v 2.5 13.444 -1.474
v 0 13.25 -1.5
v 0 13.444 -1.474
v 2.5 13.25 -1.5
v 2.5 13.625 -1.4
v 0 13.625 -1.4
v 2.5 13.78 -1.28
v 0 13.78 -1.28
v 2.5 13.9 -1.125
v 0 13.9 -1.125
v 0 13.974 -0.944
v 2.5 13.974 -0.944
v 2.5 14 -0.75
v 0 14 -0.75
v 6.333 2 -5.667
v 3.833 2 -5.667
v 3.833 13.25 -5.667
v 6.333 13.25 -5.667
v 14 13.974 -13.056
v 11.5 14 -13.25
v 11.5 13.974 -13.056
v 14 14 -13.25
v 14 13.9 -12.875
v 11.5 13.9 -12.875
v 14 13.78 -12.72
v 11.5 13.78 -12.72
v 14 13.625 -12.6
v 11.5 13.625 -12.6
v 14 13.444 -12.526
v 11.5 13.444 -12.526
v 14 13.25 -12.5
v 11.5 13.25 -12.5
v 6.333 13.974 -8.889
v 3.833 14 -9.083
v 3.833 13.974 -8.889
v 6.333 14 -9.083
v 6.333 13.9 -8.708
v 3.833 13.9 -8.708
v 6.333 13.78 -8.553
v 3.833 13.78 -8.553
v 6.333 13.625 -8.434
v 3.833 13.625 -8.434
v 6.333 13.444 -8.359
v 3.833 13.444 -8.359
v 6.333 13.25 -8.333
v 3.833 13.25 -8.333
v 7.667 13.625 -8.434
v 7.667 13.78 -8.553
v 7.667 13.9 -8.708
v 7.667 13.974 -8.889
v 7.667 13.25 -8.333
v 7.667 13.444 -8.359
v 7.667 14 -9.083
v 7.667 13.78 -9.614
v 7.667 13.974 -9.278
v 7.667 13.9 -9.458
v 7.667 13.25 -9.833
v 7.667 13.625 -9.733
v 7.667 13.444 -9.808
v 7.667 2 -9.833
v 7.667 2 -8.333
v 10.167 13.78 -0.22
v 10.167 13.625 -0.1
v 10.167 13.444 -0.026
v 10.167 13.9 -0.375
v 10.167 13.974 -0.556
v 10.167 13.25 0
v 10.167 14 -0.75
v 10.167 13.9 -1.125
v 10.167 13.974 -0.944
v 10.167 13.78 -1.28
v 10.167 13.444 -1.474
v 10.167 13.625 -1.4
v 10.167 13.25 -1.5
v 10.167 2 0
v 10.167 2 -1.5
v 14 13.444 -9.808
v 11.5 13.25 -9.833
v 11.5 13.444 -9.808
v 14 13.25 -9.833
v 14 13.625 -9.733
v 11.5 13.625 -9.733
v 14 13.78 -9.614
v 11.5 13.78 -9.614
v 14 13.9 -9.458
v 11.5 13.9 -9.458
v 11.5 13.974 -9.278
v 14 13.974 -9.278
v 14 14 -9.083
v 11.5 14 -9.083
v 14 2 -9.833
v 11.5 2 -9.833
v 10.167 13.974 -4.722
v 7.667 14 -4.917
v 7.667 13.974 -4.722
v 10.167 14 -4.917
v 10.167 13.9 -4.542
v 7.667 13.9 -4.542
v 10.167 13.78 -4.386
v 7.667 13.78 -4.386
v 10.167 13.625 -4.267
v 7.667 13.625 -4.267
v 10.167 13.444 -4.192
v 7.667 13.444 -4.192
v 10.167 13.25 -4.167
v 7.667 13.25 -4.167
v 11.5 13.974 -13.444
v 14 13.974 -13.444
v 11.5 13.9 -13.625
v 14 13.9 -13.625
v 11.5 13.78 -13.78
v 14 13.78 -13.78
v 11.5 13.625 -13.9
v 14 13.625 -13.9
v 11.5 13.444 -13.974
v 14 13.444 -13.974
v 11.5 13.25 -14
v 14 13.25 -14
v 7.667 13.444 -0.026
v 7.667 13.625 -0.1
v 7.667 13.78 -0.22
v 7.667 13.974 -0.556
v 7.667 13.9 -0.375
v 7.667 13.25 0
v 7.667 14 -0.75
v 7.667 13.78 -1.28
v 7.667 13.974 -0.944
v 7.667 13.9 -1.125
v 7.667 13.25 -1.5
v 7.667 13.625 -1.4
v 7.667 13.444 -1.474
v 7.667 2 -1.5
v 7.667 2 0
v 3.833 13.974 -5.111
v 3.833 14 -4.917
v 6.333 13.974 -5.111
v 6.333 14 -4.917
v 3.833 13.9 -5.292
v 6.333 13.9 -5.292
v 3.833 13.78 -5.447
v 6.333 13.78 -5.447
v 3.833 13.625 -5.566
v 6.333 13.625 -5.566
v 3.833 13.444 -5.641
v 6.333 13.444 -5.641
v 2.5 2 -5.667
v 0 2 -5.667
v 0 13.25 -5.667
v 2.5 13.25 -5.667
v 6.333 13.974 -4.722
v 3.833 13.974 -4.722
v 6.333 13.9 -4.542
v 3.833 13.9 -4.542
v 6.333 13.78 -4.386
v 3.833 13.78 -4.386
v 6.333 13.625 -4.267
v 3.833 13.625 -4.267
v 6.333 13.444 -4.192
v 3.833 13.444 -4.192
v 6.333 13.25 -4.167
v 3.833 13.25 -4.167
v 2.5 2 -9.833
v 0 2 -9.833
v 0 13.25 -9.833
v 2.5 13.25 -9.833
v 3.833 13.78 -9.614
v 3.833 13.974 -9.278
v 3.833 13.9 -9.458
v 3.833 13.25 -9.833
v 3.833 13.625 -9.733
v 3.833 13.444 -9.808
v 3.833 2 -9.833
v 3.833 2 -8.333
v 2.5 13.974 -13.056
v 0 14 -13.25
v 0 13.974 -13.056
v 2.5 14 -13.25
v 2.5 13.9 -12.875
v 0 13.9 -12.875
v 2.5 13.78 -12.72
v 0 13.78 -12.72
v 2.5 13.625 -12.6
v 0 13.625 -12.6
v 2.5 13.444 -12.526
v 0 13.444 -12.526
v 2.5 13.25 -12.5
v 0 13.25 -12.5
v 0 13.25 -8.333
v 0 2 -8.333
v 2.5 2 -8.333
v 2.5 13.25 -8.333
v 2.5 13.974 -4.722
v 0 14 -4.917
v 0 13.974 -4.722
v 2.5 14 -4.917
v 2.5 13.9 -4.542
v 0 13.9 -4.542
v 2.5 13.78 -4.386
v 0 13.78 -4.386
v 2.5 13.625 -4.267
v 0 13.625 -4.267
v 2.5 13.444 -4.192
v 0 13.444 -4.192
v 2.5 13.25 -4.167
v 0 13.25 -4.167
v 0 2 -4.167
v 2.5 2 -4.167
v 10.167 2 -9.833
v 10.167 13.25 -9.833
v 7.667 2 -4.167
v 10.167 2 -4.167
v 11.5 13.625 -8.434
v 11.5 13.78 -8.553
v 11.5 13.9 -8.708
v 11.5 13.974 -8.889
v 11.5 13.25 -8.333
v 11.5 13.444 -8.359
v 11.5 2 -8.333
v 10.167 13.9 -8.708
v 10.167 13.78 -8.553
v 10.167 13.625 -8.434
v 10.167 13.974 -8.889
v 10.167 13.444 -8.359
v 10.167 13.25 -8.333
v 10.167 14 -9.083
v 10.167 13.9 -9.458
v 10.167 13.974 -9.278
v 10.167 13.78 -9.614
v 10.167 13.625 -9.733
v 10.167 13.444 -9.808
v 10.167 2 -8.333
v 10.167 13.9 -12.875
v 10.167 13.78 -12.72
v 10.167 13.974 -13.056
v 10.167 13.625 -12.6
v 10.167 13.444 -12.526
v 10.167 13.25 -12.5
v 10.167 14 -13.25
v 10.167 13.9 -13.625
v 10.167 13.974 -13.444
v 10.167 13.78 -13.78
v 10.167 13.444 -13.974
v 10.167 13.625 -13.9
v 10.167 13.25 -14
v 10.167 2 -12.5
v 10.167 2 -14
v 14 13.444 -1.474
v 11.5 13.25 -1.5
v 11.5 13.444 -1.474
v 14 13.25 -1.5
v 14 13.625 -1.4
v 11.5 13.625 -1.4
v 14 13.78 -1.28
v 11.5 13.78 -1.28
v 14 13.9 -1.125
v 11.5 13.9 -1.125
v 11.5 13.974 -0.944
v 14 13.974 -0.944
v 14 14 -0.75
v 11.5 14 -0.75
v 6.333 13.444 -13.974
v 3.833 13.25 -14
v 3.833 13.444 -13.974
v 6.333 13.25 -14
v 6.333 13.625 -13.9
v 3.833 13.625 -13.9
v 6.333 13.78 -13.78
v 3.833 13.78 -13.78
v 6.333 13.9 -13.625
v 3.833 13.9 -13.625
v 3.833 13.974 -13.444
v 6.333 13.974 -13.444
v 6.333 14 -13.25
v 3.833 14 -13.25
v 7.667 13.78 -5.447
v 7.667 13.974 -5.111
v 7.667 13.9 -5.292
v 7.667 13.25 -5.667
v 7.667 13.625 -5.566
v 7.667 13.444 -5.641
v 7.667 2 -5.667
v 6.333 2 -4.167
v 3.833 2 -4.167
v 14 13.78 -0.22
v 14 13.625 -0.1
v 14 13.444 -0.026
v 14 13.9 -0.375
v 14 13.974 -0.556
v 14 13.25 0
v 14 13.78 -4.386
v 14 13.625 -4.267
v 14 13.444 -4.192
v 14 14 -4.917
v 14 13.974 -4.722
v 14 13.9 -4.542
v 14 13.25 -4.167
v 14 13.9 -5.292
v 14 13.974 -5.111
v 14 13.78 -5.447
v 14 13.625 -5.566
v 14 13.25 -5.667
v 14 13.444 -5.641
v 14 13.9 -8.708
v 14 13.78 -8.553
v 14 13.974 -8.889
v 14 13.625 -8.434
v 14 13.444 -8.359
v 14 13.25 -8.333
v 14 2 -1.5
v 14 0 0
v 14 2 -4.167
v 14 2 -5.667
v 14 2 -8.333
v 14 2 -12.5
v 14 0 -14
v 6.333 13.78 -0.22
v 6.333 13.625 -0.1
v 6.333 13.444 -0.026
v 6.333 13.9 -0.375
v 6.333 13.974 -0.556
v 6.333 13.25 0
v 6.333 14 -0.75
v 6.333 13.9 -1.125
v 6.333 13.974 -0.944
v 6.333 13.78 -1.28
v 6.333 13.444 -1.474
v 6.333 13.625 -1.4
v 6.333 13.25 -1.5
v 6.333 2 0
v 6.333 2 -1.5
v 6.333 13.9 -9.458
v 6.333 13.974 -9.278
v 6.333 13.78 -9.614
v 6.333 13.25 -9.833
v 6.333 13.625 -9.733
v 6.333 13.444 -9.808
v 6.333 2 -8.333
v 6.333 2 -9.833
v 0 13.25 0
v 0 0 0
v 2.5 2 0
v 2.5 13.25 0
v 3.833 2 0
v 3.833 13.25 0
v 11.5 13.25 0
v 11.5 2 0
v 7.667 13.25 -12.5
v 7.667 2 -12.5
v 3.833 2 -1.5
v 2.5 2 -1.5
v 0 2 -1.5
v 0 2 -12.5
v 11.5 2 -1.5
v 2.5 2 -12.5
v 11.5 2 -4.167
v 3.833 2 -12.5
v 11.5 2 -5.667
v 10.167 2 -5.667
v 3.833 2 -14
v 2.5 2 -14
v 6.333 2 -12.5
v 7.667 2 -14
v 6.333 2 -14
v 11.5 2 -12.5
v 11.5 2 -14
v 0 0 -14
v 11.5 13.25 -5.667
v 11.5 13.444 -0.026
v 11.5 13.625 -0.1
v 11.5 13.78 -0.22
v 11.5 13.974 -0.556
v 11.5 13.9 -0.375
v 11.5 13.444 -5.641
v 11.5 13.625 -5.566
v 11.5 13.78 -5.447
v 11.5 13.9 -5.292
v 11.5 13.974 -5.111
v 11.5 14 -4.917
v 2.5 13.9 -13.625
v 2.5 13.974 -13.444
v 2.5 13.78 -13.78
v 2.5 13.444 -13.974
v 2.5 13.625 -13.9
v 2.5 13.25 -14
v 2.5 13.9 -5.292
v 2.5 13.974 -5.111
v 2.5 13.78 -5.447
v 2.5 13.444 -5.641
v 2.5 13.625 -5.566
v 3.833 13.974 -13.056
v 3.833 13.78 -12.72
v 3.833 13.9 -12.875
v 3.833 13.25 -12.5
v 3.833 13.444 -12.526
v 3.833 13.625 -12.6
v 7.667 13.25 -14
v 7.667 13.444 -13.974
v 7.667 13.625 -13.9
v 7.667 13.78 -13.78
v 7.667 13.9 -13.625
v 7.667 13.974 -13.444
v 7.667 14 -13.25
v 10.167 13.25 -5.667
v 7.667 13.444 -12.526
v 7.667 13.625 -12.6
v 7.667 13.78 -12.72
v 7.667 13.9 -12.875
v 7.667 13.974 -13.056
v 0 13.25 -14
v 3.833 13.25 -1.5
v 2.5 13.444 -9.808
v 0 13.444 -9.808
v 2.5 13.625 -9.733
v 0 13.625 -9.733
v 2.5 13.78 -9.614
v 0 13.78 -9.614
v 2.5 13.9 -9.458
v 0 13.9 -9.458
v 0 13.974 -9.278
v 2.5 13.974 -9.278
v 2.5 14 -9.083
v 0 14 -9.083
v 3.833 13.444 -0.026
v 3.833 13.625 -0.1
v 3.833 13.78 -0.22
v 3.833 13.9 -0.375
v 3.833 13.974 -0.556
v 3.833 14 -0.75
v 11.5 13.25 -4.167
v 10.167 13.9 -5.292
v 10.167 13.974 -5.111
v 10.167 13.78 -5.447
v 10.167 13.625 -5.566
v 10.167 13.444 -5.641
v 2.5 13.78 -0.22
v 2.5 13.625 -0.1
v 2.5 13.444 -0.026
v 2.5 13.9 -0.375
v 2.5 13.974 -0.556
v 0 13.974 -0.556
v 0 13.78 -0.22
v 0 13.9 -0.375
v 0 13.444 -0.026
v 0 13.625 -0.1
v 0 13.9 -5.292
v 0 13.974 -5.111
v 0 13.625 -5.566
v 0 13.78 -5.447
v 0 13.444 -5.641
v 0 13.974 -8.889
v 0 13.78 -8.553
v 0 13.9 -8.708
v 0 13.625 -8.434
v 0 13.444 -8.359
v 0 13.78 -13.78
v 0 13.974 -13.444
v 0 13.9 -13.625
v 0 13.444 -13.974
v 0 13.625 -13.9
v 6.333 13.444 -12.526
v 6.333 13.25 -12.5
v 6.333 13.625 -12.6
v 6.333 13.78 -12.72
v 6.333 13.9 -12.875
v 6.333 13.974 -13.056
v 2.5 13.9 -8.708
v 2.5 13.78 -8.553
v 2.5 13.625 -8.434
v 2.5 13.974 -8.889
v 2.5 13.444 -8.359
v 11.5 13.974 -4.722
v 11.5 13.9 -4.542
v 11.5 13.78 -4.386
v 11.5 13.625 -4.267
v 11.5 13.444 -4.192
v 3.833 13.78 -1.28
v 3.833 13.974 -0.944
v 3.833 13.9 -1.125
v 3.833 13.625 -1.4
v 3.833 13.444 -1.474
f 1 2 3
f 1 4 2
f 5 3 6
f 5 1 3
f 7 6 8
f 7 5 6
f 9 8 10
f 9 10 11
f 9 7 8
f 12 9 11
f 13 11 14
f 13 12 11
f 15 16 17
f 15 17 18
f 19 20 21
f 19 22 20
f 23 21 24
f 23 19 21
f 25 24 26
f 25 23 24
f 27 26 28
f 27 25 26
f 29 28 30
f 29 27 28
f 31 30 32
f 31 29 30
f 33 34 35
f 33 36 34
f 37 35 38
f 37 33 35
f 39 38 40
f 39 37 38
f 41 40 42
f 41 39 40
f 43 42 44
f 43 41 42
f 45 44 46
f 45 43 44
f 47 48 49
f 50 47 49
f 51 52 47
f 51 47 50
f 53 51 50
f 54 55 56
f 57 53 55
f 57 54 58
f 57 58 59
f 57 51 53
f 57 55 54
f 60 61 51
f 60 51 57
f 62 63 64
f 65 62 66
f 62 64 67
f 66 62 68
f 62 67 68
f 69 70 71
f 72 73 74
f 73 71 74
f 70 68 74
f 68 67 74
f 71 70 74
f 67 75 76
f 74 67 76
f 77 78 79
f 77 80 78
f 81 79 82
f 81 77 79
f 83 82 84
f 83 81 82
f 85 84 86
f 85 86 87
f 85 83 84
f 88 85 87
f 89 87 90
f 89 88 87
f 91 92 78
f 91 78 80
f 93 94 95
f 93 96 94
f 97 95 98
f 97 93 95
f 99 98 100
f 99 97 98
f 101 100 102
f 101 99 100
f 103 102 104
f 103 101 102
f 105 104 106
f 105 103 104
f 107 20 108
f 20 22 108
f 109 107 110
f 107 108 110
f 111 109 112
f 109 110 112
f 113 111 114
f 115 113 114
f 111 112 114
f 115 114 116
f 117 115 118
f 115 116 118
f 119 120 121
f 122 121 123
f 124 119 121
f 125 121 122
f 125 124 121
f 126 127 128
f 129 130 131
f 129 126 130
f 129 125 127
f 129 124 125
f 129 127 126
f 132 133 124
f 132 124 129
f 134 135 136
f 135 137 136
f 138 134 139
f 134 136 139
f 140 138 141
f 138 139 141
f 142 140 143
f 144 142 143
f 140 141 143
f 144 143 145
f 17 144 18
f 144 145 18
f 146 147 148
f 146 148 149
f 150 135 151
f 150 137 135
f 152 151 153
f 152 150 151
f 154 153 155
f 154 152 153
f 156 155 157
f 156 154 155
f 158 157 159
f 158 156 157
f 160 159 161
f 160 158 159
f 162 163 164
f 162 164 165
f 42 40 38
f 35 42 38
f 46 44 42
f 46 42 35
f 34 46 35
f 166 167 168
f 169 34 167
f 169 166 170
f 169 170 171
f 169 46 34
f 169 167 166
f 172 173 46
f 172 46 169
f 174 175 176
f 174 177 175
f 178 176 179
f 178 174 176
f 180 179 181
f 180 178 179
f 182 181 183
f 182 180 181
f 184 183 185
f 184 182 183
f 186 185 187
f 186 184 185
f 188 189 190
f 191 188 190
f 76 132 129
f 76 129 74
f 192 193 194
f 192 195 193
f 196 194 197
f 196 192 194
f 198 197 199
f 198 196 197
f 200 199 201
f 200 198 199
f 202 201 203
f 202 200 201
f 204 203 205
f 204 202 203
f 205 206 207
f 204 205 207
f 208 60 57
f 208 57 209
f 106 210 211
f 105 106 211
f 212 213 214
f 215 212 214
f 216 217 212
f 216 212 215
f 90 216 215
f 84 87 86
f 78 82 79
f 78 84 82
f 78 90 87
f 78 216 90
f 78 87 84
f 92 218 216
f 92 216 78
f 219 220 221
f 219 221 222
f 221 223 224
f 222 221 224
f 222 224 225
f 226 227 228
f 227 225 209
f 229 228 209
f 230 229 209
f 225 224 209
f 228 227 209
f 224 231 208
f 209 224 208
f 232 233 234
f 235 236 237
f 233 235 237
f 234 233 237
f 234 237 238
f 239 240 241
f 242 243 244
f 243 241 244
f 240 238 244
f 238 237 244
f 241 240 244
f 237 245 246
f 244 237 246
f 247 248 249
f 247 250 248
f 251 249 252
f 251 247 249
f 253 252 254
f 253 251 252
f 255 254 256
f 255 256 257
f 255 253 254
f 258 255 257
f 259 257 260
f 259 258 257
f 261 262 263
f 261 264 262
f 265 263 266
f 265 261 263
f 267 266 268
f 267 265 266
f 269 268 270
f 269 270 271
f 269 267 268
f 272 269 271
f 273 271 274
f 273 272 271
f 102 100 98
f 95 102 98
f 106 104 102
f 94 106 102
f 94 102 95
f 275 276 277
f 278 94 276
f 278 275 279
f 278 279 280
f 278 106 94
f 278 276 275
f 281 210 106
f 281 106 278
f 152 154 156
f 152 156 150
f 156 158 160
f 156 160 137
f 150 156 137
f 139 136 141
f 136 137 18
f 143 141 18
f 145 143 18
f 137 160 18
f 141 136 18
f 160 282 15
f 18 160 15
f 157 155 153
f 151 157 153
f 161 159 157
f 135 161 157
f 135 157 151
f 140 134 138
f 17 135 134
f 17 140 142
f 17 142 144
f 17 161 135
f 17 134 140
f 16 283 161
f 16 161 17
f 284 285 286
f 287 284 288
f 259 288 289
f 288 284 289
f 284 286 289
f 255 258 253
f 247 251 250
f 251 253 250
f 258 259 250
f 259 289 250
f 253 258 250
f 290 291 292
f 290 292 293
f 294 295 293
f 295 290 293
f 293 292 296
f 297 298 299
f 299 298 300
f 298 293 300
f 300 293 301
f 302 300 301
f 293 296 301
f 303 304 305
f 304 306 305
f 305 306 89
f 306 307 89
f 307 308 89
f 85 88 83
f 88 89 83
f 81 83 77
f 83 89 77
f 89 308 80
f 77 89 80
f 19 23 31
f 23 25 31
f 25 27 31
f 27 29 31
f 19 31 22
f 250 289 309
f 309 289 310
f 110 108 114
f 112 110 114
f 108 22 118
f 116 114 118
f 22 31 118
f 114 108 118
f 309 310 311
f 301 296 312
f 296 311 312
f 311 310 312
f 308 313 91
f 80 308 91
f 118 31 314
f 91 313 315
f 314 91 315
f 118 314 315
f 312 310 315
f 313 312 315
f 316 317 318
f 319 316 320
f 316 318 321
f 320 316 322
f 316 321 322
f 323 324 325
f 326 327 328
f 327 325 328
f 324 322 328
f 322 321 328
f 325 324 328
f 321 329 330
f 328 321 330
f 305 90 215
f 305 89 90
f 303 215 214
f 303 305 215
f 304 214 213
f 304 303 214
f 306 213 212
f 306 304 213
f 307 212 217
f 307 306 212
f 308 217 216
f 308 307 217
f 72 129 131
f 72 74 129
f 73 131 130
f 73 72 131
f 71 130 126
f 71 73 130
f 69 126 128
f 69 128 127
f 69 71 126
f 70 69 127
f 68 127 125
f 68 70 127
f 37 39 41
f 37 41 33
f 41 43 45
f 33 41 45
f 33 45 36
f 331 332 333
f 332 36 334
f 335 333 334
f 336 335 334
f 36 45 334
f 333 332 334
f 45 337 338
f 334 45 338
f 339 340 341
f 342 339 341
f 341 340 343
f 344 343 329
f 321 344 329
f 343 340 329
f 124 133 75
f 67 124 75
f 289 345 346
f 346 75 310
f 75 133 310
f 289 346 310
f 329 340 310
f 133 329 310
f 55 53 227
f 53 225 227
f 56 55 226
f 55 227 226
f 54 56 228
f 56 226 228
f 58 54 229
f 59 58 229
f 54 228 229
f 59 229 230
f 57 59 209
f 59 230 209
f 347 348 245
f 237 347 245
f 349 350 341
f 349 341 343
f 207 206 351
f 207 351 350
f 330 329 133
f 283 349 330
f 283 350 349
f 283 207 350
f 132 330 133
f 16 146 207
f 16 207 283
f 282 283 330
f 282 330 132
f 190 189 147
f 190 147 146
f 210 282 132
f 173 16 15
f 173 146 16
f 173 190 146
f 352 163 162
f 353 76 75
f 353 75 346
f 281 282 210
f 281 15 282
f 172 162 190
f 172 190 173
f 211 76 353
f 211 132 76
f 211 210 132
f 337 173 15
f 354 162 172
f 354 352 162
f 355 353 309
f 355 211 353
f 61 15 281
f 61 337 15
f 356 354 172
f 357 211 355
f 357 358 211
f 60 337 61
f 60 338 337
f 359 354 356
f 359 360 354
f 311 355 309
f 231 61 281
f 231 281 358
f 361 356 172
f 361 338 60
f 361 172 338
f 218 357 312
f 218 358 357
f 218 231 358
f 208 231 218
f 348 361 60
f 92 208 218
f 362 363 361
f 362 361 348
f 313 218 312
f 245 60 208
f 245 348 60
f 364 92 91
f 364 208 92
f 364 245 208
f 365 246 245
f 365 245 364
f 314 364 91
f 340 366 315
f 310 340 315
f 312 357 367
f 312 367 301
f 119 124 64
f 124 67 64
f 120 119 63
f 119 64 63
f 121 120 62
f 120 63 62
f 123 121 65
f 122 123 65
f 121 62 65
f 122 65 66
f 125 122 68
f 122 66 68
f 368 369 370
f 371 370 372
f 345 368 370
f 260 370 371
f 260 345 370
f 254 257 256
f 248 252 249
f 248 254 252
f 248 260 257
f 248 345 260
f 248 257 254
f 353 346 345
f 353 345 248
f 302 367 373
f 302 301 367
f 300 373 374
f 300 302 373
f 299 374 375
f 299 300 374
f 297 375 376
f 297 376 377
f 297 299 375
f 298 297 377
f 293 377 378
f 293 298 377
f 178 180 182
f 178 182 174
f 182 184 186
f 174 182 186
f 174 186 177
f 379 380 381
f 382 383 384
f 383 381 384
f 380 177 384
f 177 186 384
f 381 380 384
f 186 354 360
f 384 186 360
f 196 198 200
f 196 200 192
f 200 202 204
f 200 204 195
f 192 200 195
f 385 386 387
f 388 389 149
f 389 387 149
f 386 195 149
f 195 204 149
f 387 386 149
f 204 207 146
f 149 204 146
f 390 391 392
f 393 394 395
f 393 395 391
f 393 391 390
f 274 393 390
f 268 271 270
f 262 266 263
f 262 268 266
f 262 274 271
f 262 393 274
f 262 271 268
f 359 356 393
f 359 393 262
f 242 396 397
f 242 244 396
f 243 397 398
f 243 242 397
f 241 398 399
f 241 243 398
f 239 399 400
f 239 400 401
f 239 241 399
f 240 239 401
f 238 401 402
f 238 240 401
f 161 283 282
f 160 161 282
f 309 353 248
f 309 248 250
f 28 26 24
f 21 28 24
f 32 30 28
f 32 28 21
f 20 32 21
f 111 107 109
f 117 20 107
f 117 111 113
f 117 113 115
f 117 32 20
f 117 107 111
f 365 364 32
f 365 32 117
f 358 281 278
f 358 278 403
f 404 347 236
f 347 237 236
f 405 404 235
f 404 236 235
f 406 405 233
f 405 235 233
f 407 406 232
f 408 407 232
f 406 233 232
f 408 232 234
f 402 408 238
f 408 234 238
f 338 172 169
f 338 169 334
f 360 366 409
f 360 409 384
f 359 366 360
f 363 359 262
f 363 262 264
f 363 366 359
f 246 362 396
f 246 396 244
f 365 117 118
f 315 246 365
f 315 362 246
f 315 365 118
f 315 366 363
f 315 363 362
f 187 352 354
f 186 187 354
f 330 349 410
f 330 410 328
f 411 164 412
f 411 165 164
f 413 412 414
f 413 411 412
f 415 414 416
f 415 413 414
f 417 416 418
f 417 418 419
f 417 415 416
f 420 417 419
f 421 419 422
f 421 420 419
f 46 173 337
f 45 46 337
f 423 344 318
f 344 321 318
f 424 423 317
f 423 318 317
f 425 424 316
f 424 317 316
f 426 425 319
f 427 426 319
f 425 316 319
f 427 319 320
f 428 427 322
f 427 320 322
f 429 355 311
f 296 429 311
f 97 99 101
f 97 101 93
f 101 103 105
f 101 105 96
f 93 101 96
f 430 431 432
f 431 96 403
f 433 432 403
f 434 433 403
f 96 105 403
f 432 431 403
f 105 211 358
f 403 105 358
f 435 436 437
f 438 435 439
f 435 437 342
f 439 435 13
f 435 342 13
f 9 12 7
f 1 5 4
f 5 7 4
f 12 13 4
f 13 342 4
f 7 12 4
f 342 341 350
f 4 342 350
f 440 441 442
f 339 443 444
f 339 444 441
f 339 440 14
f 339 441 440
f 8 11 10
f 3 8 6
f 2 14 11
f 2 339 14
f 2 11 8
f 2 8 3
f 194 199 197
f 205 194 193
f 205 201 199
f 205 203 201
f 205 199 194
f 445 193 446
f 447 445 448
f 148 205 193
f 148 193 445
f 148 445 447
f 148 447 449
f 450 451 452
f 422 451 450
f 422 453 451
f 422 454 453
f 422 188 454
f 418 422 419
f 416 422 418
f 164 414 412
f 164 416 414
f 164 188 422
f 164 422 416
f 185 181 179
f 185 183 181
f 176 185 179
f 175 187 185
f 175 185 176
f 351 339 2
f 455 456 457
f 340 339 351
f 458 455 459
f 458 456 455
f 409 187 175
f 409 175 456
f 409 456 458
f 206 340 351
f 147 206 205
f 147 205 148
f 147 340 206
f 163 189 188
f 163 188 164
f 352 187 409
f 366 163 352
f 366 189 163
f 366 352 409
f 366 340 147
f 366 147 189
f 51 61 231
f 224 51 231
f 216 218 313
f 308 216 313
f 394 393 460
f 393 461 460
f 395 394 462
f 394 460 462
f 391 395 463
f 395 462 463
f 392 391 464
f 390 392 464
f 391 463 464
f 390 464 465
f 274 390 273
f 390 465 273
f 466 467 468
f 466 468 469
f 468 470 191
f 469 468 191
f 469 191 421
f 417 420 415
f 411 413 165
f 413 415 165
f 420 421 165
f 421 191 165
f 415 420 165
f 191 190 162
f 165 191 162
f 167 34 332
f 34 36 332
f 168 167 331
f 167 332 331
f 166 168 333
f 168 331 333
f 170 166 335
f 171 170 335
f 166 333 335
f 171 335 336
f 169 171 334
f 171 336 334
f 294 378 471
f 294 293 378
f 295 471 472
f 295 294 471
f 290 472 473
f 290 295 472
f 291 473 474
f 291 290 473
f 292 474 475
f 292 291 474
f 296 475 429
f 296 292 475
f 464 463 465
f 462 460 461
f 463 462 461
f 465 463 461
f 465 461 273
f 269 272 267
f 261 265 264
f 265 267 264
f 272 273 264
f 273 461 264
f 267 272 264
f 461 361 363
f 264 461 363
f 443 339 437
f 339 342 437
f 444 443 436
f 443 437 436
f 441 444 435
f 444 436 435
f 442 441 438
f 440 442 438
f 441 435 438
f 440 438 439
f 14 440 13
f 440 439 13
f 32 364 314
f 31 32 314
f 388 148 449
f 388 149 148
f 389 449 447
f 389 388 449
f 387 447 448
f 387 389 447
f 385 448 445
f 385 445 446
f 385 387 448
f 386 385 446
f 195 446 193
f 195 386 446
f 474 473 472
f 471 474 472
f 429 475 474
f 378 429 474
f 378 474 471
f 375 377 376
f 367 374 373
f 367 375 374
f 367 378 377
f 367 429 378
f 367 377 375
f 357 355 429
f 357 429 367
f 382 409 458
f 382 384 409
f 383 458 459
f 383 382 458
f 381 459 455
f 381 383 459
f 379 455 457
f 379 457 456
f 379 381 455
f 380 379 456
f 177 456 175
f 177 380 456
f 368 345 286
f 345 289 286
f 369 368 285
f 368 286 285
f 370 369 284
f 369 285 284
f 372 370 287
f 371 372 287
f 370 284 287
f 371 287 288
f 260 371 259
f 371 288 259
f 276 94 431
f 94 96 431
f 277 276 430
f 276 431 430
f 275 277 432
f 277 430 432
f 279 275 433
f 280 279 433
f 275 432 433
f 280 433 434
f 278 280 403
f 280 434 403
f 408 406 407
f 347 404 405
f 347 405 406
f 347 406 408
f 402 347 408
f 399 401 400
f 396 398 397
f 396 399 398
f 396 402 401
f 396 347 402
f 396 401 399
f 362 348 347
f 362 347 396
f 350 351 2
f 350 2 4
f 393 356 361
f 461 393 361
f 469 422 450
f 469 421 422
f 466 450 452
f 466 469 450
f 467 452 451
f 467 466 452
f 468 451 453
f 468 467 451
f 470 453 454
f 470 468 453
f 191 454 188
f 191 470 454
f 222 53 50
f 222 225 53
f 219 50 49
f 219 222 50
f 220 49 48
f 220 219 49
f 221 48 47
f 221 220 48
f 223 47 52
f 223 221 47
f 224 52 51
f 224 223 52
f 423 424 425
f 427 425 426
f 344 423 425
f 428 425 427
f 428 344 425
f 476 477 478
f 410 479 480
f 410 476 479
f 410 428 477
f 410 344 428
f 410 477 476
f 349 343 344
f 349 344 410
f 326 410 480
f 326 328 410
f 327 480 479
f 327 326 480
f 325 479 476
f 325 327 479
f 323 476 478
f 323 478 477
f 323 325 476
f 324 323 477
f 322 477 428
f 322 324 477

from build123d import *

# Parameters (mm, degrees)
SKETCH1_W           = 14
SKETCH1_H           = 14
BOSS_EXTRUDE1_DEPTH = 2
SKETCH2_W           = 2.5
SKETCH2_H           = 1.5
BOSS_EXTRUDE2_DEPTH = 12
FILLET1_R           = 0.75


with BuildPart() as part:
    # Sketch1 → Boss-Extrude1 (new body)
    with BuildSketch(Plane(origin=(0, 0, 0), x_dir=(1, 0, 0), z_dir=(0, 1, 0))):
        with Locations((7, 7)):
            Rectangle(SKETCH1_W, SKETCH1_H)
    extrude(amount=BOSS_EXTRUDE1_DEPTH)

    # Sketch2 → Boss-Extrude2 (add)
    with BuildSketch(Plane(origin=(0, 2, 0), x_dir=(1, 0, 0), z_dir=(0, 1, 0))):
        with Locations((5.083333333, 0.75)):
            Rectangle(SKETCH2_W, SKETCH2_H)
        with Locations((1.25, 0.75)):
            Rectangle(SKETCH2_W, SKETCH2_H)
        with Locations((8.916666667, 0.75)):
            Rectangle(SKETCH2_W, SKETCH2_H)
        with Locations((12.75, 0.75)):
            Rectangle(SKETCH2_W, SKETCH2_H)
        with Locations((5.083333333, 4.916666667)):
            Rectangle(SKETCH2_W, SKETCH2_H)
        with Locations((8.916666667, 4.916666667)):
            Rectangle(SKETCH2_W, SKETCH2_H)
        with Locations((12.75, 4.916666667)):
            Rectangle(SKETCH2_W, SKETCH2_H)
        with Locations((5.083333333, 9.083333333)):
            Rectangle(SKETCH2_W, SKETCH2_H)
        with Locations((8.916666667, 9.083333333)):
            Rectangle(SKETCH2_W, SKETCH2_H)
        with Locations((12.75, 9.083333333)):
            Rectangle(SKETCH2_W, SKETCH2_H)
        with Locations((5.083333333, 13.25)):
            Rectangle(SKETCH2_W, SKETCH2_H)
        with Locations((8.916666667, 13.25)):
            Rectangle(SKETCH2_W, SKETCH2_H)
        with Locations((12.75, 13.25)):
            Rectangle(SKETCH2_W, SKETCH2_H)
        with Locations((1.25, 4.916666667)):
            Rectangle(SKETCH2_W, SKETCH2_H)
        with Locations((1.25, 9.083333333)):
            Rectangle(SKETCH2_W, SKETCH2_H)
        with Locations((1.25, 13.25)):
            Rectangle(SKETCH2_W, SKETCH2_H)
    extrude(amount=BOSS_EXTRUDE2_DEPTH)

    # Fillet1
    fillet1_edges = [part.edges().sort_by_distance(p)[0] for p in [
        (12.75, 14, -12.5),
        (8.916666667, 14, -12.5),
        (5.083333333, 14, -12.5),
        (1.25, 14, -12.5),
        (1.25, 14, -14),
        (5.083333333, 14, -14),
        (8.916666667, 14, -14),
        (12.75, 14, -14),
        (12.75, 14, -9.833333333),
        (8.916666667, 14, -9.833333333),
        (5.083333333, 14, -9.833333333),
        (1.25, 14, -9.833333333),
        (1.25, 14, -8.333333333),
        (5.083333333, 14, -8.333333333),
        (8.916666667, 14, -8.333333333),
        (12.75, 14, -8.333333333),
        (8.916666667, 14, -5.666666667),
        (12.75, 14, -5.666666667),
        (5.083333333, 14, -5.666666667),
        (1.25, 14, -5.666666667),
        (1.25, 14, -4.166666667),
        (5.083333333, 14, -4.166666667),
        (8.916666667, 14, -4.166666667),
        (12.75, 14, -4.166666667),
        (8.916666667, 14, 0),
        (12.75, 14, 0),
        (12.75, 14, -1.5),
        (8.916666667, 14, -1.5),
        (5.083333333, 14, -1.5),
        (5.083333333, 14, 0),
        (1.25, 14, -1.5),
        (1.25, 14, 0),
    ]]
    fillet(fillet1_edges, radius=FILLET1_R - 0.0001)  # a hair under: the kernel refuses the full size


solid = part.part
